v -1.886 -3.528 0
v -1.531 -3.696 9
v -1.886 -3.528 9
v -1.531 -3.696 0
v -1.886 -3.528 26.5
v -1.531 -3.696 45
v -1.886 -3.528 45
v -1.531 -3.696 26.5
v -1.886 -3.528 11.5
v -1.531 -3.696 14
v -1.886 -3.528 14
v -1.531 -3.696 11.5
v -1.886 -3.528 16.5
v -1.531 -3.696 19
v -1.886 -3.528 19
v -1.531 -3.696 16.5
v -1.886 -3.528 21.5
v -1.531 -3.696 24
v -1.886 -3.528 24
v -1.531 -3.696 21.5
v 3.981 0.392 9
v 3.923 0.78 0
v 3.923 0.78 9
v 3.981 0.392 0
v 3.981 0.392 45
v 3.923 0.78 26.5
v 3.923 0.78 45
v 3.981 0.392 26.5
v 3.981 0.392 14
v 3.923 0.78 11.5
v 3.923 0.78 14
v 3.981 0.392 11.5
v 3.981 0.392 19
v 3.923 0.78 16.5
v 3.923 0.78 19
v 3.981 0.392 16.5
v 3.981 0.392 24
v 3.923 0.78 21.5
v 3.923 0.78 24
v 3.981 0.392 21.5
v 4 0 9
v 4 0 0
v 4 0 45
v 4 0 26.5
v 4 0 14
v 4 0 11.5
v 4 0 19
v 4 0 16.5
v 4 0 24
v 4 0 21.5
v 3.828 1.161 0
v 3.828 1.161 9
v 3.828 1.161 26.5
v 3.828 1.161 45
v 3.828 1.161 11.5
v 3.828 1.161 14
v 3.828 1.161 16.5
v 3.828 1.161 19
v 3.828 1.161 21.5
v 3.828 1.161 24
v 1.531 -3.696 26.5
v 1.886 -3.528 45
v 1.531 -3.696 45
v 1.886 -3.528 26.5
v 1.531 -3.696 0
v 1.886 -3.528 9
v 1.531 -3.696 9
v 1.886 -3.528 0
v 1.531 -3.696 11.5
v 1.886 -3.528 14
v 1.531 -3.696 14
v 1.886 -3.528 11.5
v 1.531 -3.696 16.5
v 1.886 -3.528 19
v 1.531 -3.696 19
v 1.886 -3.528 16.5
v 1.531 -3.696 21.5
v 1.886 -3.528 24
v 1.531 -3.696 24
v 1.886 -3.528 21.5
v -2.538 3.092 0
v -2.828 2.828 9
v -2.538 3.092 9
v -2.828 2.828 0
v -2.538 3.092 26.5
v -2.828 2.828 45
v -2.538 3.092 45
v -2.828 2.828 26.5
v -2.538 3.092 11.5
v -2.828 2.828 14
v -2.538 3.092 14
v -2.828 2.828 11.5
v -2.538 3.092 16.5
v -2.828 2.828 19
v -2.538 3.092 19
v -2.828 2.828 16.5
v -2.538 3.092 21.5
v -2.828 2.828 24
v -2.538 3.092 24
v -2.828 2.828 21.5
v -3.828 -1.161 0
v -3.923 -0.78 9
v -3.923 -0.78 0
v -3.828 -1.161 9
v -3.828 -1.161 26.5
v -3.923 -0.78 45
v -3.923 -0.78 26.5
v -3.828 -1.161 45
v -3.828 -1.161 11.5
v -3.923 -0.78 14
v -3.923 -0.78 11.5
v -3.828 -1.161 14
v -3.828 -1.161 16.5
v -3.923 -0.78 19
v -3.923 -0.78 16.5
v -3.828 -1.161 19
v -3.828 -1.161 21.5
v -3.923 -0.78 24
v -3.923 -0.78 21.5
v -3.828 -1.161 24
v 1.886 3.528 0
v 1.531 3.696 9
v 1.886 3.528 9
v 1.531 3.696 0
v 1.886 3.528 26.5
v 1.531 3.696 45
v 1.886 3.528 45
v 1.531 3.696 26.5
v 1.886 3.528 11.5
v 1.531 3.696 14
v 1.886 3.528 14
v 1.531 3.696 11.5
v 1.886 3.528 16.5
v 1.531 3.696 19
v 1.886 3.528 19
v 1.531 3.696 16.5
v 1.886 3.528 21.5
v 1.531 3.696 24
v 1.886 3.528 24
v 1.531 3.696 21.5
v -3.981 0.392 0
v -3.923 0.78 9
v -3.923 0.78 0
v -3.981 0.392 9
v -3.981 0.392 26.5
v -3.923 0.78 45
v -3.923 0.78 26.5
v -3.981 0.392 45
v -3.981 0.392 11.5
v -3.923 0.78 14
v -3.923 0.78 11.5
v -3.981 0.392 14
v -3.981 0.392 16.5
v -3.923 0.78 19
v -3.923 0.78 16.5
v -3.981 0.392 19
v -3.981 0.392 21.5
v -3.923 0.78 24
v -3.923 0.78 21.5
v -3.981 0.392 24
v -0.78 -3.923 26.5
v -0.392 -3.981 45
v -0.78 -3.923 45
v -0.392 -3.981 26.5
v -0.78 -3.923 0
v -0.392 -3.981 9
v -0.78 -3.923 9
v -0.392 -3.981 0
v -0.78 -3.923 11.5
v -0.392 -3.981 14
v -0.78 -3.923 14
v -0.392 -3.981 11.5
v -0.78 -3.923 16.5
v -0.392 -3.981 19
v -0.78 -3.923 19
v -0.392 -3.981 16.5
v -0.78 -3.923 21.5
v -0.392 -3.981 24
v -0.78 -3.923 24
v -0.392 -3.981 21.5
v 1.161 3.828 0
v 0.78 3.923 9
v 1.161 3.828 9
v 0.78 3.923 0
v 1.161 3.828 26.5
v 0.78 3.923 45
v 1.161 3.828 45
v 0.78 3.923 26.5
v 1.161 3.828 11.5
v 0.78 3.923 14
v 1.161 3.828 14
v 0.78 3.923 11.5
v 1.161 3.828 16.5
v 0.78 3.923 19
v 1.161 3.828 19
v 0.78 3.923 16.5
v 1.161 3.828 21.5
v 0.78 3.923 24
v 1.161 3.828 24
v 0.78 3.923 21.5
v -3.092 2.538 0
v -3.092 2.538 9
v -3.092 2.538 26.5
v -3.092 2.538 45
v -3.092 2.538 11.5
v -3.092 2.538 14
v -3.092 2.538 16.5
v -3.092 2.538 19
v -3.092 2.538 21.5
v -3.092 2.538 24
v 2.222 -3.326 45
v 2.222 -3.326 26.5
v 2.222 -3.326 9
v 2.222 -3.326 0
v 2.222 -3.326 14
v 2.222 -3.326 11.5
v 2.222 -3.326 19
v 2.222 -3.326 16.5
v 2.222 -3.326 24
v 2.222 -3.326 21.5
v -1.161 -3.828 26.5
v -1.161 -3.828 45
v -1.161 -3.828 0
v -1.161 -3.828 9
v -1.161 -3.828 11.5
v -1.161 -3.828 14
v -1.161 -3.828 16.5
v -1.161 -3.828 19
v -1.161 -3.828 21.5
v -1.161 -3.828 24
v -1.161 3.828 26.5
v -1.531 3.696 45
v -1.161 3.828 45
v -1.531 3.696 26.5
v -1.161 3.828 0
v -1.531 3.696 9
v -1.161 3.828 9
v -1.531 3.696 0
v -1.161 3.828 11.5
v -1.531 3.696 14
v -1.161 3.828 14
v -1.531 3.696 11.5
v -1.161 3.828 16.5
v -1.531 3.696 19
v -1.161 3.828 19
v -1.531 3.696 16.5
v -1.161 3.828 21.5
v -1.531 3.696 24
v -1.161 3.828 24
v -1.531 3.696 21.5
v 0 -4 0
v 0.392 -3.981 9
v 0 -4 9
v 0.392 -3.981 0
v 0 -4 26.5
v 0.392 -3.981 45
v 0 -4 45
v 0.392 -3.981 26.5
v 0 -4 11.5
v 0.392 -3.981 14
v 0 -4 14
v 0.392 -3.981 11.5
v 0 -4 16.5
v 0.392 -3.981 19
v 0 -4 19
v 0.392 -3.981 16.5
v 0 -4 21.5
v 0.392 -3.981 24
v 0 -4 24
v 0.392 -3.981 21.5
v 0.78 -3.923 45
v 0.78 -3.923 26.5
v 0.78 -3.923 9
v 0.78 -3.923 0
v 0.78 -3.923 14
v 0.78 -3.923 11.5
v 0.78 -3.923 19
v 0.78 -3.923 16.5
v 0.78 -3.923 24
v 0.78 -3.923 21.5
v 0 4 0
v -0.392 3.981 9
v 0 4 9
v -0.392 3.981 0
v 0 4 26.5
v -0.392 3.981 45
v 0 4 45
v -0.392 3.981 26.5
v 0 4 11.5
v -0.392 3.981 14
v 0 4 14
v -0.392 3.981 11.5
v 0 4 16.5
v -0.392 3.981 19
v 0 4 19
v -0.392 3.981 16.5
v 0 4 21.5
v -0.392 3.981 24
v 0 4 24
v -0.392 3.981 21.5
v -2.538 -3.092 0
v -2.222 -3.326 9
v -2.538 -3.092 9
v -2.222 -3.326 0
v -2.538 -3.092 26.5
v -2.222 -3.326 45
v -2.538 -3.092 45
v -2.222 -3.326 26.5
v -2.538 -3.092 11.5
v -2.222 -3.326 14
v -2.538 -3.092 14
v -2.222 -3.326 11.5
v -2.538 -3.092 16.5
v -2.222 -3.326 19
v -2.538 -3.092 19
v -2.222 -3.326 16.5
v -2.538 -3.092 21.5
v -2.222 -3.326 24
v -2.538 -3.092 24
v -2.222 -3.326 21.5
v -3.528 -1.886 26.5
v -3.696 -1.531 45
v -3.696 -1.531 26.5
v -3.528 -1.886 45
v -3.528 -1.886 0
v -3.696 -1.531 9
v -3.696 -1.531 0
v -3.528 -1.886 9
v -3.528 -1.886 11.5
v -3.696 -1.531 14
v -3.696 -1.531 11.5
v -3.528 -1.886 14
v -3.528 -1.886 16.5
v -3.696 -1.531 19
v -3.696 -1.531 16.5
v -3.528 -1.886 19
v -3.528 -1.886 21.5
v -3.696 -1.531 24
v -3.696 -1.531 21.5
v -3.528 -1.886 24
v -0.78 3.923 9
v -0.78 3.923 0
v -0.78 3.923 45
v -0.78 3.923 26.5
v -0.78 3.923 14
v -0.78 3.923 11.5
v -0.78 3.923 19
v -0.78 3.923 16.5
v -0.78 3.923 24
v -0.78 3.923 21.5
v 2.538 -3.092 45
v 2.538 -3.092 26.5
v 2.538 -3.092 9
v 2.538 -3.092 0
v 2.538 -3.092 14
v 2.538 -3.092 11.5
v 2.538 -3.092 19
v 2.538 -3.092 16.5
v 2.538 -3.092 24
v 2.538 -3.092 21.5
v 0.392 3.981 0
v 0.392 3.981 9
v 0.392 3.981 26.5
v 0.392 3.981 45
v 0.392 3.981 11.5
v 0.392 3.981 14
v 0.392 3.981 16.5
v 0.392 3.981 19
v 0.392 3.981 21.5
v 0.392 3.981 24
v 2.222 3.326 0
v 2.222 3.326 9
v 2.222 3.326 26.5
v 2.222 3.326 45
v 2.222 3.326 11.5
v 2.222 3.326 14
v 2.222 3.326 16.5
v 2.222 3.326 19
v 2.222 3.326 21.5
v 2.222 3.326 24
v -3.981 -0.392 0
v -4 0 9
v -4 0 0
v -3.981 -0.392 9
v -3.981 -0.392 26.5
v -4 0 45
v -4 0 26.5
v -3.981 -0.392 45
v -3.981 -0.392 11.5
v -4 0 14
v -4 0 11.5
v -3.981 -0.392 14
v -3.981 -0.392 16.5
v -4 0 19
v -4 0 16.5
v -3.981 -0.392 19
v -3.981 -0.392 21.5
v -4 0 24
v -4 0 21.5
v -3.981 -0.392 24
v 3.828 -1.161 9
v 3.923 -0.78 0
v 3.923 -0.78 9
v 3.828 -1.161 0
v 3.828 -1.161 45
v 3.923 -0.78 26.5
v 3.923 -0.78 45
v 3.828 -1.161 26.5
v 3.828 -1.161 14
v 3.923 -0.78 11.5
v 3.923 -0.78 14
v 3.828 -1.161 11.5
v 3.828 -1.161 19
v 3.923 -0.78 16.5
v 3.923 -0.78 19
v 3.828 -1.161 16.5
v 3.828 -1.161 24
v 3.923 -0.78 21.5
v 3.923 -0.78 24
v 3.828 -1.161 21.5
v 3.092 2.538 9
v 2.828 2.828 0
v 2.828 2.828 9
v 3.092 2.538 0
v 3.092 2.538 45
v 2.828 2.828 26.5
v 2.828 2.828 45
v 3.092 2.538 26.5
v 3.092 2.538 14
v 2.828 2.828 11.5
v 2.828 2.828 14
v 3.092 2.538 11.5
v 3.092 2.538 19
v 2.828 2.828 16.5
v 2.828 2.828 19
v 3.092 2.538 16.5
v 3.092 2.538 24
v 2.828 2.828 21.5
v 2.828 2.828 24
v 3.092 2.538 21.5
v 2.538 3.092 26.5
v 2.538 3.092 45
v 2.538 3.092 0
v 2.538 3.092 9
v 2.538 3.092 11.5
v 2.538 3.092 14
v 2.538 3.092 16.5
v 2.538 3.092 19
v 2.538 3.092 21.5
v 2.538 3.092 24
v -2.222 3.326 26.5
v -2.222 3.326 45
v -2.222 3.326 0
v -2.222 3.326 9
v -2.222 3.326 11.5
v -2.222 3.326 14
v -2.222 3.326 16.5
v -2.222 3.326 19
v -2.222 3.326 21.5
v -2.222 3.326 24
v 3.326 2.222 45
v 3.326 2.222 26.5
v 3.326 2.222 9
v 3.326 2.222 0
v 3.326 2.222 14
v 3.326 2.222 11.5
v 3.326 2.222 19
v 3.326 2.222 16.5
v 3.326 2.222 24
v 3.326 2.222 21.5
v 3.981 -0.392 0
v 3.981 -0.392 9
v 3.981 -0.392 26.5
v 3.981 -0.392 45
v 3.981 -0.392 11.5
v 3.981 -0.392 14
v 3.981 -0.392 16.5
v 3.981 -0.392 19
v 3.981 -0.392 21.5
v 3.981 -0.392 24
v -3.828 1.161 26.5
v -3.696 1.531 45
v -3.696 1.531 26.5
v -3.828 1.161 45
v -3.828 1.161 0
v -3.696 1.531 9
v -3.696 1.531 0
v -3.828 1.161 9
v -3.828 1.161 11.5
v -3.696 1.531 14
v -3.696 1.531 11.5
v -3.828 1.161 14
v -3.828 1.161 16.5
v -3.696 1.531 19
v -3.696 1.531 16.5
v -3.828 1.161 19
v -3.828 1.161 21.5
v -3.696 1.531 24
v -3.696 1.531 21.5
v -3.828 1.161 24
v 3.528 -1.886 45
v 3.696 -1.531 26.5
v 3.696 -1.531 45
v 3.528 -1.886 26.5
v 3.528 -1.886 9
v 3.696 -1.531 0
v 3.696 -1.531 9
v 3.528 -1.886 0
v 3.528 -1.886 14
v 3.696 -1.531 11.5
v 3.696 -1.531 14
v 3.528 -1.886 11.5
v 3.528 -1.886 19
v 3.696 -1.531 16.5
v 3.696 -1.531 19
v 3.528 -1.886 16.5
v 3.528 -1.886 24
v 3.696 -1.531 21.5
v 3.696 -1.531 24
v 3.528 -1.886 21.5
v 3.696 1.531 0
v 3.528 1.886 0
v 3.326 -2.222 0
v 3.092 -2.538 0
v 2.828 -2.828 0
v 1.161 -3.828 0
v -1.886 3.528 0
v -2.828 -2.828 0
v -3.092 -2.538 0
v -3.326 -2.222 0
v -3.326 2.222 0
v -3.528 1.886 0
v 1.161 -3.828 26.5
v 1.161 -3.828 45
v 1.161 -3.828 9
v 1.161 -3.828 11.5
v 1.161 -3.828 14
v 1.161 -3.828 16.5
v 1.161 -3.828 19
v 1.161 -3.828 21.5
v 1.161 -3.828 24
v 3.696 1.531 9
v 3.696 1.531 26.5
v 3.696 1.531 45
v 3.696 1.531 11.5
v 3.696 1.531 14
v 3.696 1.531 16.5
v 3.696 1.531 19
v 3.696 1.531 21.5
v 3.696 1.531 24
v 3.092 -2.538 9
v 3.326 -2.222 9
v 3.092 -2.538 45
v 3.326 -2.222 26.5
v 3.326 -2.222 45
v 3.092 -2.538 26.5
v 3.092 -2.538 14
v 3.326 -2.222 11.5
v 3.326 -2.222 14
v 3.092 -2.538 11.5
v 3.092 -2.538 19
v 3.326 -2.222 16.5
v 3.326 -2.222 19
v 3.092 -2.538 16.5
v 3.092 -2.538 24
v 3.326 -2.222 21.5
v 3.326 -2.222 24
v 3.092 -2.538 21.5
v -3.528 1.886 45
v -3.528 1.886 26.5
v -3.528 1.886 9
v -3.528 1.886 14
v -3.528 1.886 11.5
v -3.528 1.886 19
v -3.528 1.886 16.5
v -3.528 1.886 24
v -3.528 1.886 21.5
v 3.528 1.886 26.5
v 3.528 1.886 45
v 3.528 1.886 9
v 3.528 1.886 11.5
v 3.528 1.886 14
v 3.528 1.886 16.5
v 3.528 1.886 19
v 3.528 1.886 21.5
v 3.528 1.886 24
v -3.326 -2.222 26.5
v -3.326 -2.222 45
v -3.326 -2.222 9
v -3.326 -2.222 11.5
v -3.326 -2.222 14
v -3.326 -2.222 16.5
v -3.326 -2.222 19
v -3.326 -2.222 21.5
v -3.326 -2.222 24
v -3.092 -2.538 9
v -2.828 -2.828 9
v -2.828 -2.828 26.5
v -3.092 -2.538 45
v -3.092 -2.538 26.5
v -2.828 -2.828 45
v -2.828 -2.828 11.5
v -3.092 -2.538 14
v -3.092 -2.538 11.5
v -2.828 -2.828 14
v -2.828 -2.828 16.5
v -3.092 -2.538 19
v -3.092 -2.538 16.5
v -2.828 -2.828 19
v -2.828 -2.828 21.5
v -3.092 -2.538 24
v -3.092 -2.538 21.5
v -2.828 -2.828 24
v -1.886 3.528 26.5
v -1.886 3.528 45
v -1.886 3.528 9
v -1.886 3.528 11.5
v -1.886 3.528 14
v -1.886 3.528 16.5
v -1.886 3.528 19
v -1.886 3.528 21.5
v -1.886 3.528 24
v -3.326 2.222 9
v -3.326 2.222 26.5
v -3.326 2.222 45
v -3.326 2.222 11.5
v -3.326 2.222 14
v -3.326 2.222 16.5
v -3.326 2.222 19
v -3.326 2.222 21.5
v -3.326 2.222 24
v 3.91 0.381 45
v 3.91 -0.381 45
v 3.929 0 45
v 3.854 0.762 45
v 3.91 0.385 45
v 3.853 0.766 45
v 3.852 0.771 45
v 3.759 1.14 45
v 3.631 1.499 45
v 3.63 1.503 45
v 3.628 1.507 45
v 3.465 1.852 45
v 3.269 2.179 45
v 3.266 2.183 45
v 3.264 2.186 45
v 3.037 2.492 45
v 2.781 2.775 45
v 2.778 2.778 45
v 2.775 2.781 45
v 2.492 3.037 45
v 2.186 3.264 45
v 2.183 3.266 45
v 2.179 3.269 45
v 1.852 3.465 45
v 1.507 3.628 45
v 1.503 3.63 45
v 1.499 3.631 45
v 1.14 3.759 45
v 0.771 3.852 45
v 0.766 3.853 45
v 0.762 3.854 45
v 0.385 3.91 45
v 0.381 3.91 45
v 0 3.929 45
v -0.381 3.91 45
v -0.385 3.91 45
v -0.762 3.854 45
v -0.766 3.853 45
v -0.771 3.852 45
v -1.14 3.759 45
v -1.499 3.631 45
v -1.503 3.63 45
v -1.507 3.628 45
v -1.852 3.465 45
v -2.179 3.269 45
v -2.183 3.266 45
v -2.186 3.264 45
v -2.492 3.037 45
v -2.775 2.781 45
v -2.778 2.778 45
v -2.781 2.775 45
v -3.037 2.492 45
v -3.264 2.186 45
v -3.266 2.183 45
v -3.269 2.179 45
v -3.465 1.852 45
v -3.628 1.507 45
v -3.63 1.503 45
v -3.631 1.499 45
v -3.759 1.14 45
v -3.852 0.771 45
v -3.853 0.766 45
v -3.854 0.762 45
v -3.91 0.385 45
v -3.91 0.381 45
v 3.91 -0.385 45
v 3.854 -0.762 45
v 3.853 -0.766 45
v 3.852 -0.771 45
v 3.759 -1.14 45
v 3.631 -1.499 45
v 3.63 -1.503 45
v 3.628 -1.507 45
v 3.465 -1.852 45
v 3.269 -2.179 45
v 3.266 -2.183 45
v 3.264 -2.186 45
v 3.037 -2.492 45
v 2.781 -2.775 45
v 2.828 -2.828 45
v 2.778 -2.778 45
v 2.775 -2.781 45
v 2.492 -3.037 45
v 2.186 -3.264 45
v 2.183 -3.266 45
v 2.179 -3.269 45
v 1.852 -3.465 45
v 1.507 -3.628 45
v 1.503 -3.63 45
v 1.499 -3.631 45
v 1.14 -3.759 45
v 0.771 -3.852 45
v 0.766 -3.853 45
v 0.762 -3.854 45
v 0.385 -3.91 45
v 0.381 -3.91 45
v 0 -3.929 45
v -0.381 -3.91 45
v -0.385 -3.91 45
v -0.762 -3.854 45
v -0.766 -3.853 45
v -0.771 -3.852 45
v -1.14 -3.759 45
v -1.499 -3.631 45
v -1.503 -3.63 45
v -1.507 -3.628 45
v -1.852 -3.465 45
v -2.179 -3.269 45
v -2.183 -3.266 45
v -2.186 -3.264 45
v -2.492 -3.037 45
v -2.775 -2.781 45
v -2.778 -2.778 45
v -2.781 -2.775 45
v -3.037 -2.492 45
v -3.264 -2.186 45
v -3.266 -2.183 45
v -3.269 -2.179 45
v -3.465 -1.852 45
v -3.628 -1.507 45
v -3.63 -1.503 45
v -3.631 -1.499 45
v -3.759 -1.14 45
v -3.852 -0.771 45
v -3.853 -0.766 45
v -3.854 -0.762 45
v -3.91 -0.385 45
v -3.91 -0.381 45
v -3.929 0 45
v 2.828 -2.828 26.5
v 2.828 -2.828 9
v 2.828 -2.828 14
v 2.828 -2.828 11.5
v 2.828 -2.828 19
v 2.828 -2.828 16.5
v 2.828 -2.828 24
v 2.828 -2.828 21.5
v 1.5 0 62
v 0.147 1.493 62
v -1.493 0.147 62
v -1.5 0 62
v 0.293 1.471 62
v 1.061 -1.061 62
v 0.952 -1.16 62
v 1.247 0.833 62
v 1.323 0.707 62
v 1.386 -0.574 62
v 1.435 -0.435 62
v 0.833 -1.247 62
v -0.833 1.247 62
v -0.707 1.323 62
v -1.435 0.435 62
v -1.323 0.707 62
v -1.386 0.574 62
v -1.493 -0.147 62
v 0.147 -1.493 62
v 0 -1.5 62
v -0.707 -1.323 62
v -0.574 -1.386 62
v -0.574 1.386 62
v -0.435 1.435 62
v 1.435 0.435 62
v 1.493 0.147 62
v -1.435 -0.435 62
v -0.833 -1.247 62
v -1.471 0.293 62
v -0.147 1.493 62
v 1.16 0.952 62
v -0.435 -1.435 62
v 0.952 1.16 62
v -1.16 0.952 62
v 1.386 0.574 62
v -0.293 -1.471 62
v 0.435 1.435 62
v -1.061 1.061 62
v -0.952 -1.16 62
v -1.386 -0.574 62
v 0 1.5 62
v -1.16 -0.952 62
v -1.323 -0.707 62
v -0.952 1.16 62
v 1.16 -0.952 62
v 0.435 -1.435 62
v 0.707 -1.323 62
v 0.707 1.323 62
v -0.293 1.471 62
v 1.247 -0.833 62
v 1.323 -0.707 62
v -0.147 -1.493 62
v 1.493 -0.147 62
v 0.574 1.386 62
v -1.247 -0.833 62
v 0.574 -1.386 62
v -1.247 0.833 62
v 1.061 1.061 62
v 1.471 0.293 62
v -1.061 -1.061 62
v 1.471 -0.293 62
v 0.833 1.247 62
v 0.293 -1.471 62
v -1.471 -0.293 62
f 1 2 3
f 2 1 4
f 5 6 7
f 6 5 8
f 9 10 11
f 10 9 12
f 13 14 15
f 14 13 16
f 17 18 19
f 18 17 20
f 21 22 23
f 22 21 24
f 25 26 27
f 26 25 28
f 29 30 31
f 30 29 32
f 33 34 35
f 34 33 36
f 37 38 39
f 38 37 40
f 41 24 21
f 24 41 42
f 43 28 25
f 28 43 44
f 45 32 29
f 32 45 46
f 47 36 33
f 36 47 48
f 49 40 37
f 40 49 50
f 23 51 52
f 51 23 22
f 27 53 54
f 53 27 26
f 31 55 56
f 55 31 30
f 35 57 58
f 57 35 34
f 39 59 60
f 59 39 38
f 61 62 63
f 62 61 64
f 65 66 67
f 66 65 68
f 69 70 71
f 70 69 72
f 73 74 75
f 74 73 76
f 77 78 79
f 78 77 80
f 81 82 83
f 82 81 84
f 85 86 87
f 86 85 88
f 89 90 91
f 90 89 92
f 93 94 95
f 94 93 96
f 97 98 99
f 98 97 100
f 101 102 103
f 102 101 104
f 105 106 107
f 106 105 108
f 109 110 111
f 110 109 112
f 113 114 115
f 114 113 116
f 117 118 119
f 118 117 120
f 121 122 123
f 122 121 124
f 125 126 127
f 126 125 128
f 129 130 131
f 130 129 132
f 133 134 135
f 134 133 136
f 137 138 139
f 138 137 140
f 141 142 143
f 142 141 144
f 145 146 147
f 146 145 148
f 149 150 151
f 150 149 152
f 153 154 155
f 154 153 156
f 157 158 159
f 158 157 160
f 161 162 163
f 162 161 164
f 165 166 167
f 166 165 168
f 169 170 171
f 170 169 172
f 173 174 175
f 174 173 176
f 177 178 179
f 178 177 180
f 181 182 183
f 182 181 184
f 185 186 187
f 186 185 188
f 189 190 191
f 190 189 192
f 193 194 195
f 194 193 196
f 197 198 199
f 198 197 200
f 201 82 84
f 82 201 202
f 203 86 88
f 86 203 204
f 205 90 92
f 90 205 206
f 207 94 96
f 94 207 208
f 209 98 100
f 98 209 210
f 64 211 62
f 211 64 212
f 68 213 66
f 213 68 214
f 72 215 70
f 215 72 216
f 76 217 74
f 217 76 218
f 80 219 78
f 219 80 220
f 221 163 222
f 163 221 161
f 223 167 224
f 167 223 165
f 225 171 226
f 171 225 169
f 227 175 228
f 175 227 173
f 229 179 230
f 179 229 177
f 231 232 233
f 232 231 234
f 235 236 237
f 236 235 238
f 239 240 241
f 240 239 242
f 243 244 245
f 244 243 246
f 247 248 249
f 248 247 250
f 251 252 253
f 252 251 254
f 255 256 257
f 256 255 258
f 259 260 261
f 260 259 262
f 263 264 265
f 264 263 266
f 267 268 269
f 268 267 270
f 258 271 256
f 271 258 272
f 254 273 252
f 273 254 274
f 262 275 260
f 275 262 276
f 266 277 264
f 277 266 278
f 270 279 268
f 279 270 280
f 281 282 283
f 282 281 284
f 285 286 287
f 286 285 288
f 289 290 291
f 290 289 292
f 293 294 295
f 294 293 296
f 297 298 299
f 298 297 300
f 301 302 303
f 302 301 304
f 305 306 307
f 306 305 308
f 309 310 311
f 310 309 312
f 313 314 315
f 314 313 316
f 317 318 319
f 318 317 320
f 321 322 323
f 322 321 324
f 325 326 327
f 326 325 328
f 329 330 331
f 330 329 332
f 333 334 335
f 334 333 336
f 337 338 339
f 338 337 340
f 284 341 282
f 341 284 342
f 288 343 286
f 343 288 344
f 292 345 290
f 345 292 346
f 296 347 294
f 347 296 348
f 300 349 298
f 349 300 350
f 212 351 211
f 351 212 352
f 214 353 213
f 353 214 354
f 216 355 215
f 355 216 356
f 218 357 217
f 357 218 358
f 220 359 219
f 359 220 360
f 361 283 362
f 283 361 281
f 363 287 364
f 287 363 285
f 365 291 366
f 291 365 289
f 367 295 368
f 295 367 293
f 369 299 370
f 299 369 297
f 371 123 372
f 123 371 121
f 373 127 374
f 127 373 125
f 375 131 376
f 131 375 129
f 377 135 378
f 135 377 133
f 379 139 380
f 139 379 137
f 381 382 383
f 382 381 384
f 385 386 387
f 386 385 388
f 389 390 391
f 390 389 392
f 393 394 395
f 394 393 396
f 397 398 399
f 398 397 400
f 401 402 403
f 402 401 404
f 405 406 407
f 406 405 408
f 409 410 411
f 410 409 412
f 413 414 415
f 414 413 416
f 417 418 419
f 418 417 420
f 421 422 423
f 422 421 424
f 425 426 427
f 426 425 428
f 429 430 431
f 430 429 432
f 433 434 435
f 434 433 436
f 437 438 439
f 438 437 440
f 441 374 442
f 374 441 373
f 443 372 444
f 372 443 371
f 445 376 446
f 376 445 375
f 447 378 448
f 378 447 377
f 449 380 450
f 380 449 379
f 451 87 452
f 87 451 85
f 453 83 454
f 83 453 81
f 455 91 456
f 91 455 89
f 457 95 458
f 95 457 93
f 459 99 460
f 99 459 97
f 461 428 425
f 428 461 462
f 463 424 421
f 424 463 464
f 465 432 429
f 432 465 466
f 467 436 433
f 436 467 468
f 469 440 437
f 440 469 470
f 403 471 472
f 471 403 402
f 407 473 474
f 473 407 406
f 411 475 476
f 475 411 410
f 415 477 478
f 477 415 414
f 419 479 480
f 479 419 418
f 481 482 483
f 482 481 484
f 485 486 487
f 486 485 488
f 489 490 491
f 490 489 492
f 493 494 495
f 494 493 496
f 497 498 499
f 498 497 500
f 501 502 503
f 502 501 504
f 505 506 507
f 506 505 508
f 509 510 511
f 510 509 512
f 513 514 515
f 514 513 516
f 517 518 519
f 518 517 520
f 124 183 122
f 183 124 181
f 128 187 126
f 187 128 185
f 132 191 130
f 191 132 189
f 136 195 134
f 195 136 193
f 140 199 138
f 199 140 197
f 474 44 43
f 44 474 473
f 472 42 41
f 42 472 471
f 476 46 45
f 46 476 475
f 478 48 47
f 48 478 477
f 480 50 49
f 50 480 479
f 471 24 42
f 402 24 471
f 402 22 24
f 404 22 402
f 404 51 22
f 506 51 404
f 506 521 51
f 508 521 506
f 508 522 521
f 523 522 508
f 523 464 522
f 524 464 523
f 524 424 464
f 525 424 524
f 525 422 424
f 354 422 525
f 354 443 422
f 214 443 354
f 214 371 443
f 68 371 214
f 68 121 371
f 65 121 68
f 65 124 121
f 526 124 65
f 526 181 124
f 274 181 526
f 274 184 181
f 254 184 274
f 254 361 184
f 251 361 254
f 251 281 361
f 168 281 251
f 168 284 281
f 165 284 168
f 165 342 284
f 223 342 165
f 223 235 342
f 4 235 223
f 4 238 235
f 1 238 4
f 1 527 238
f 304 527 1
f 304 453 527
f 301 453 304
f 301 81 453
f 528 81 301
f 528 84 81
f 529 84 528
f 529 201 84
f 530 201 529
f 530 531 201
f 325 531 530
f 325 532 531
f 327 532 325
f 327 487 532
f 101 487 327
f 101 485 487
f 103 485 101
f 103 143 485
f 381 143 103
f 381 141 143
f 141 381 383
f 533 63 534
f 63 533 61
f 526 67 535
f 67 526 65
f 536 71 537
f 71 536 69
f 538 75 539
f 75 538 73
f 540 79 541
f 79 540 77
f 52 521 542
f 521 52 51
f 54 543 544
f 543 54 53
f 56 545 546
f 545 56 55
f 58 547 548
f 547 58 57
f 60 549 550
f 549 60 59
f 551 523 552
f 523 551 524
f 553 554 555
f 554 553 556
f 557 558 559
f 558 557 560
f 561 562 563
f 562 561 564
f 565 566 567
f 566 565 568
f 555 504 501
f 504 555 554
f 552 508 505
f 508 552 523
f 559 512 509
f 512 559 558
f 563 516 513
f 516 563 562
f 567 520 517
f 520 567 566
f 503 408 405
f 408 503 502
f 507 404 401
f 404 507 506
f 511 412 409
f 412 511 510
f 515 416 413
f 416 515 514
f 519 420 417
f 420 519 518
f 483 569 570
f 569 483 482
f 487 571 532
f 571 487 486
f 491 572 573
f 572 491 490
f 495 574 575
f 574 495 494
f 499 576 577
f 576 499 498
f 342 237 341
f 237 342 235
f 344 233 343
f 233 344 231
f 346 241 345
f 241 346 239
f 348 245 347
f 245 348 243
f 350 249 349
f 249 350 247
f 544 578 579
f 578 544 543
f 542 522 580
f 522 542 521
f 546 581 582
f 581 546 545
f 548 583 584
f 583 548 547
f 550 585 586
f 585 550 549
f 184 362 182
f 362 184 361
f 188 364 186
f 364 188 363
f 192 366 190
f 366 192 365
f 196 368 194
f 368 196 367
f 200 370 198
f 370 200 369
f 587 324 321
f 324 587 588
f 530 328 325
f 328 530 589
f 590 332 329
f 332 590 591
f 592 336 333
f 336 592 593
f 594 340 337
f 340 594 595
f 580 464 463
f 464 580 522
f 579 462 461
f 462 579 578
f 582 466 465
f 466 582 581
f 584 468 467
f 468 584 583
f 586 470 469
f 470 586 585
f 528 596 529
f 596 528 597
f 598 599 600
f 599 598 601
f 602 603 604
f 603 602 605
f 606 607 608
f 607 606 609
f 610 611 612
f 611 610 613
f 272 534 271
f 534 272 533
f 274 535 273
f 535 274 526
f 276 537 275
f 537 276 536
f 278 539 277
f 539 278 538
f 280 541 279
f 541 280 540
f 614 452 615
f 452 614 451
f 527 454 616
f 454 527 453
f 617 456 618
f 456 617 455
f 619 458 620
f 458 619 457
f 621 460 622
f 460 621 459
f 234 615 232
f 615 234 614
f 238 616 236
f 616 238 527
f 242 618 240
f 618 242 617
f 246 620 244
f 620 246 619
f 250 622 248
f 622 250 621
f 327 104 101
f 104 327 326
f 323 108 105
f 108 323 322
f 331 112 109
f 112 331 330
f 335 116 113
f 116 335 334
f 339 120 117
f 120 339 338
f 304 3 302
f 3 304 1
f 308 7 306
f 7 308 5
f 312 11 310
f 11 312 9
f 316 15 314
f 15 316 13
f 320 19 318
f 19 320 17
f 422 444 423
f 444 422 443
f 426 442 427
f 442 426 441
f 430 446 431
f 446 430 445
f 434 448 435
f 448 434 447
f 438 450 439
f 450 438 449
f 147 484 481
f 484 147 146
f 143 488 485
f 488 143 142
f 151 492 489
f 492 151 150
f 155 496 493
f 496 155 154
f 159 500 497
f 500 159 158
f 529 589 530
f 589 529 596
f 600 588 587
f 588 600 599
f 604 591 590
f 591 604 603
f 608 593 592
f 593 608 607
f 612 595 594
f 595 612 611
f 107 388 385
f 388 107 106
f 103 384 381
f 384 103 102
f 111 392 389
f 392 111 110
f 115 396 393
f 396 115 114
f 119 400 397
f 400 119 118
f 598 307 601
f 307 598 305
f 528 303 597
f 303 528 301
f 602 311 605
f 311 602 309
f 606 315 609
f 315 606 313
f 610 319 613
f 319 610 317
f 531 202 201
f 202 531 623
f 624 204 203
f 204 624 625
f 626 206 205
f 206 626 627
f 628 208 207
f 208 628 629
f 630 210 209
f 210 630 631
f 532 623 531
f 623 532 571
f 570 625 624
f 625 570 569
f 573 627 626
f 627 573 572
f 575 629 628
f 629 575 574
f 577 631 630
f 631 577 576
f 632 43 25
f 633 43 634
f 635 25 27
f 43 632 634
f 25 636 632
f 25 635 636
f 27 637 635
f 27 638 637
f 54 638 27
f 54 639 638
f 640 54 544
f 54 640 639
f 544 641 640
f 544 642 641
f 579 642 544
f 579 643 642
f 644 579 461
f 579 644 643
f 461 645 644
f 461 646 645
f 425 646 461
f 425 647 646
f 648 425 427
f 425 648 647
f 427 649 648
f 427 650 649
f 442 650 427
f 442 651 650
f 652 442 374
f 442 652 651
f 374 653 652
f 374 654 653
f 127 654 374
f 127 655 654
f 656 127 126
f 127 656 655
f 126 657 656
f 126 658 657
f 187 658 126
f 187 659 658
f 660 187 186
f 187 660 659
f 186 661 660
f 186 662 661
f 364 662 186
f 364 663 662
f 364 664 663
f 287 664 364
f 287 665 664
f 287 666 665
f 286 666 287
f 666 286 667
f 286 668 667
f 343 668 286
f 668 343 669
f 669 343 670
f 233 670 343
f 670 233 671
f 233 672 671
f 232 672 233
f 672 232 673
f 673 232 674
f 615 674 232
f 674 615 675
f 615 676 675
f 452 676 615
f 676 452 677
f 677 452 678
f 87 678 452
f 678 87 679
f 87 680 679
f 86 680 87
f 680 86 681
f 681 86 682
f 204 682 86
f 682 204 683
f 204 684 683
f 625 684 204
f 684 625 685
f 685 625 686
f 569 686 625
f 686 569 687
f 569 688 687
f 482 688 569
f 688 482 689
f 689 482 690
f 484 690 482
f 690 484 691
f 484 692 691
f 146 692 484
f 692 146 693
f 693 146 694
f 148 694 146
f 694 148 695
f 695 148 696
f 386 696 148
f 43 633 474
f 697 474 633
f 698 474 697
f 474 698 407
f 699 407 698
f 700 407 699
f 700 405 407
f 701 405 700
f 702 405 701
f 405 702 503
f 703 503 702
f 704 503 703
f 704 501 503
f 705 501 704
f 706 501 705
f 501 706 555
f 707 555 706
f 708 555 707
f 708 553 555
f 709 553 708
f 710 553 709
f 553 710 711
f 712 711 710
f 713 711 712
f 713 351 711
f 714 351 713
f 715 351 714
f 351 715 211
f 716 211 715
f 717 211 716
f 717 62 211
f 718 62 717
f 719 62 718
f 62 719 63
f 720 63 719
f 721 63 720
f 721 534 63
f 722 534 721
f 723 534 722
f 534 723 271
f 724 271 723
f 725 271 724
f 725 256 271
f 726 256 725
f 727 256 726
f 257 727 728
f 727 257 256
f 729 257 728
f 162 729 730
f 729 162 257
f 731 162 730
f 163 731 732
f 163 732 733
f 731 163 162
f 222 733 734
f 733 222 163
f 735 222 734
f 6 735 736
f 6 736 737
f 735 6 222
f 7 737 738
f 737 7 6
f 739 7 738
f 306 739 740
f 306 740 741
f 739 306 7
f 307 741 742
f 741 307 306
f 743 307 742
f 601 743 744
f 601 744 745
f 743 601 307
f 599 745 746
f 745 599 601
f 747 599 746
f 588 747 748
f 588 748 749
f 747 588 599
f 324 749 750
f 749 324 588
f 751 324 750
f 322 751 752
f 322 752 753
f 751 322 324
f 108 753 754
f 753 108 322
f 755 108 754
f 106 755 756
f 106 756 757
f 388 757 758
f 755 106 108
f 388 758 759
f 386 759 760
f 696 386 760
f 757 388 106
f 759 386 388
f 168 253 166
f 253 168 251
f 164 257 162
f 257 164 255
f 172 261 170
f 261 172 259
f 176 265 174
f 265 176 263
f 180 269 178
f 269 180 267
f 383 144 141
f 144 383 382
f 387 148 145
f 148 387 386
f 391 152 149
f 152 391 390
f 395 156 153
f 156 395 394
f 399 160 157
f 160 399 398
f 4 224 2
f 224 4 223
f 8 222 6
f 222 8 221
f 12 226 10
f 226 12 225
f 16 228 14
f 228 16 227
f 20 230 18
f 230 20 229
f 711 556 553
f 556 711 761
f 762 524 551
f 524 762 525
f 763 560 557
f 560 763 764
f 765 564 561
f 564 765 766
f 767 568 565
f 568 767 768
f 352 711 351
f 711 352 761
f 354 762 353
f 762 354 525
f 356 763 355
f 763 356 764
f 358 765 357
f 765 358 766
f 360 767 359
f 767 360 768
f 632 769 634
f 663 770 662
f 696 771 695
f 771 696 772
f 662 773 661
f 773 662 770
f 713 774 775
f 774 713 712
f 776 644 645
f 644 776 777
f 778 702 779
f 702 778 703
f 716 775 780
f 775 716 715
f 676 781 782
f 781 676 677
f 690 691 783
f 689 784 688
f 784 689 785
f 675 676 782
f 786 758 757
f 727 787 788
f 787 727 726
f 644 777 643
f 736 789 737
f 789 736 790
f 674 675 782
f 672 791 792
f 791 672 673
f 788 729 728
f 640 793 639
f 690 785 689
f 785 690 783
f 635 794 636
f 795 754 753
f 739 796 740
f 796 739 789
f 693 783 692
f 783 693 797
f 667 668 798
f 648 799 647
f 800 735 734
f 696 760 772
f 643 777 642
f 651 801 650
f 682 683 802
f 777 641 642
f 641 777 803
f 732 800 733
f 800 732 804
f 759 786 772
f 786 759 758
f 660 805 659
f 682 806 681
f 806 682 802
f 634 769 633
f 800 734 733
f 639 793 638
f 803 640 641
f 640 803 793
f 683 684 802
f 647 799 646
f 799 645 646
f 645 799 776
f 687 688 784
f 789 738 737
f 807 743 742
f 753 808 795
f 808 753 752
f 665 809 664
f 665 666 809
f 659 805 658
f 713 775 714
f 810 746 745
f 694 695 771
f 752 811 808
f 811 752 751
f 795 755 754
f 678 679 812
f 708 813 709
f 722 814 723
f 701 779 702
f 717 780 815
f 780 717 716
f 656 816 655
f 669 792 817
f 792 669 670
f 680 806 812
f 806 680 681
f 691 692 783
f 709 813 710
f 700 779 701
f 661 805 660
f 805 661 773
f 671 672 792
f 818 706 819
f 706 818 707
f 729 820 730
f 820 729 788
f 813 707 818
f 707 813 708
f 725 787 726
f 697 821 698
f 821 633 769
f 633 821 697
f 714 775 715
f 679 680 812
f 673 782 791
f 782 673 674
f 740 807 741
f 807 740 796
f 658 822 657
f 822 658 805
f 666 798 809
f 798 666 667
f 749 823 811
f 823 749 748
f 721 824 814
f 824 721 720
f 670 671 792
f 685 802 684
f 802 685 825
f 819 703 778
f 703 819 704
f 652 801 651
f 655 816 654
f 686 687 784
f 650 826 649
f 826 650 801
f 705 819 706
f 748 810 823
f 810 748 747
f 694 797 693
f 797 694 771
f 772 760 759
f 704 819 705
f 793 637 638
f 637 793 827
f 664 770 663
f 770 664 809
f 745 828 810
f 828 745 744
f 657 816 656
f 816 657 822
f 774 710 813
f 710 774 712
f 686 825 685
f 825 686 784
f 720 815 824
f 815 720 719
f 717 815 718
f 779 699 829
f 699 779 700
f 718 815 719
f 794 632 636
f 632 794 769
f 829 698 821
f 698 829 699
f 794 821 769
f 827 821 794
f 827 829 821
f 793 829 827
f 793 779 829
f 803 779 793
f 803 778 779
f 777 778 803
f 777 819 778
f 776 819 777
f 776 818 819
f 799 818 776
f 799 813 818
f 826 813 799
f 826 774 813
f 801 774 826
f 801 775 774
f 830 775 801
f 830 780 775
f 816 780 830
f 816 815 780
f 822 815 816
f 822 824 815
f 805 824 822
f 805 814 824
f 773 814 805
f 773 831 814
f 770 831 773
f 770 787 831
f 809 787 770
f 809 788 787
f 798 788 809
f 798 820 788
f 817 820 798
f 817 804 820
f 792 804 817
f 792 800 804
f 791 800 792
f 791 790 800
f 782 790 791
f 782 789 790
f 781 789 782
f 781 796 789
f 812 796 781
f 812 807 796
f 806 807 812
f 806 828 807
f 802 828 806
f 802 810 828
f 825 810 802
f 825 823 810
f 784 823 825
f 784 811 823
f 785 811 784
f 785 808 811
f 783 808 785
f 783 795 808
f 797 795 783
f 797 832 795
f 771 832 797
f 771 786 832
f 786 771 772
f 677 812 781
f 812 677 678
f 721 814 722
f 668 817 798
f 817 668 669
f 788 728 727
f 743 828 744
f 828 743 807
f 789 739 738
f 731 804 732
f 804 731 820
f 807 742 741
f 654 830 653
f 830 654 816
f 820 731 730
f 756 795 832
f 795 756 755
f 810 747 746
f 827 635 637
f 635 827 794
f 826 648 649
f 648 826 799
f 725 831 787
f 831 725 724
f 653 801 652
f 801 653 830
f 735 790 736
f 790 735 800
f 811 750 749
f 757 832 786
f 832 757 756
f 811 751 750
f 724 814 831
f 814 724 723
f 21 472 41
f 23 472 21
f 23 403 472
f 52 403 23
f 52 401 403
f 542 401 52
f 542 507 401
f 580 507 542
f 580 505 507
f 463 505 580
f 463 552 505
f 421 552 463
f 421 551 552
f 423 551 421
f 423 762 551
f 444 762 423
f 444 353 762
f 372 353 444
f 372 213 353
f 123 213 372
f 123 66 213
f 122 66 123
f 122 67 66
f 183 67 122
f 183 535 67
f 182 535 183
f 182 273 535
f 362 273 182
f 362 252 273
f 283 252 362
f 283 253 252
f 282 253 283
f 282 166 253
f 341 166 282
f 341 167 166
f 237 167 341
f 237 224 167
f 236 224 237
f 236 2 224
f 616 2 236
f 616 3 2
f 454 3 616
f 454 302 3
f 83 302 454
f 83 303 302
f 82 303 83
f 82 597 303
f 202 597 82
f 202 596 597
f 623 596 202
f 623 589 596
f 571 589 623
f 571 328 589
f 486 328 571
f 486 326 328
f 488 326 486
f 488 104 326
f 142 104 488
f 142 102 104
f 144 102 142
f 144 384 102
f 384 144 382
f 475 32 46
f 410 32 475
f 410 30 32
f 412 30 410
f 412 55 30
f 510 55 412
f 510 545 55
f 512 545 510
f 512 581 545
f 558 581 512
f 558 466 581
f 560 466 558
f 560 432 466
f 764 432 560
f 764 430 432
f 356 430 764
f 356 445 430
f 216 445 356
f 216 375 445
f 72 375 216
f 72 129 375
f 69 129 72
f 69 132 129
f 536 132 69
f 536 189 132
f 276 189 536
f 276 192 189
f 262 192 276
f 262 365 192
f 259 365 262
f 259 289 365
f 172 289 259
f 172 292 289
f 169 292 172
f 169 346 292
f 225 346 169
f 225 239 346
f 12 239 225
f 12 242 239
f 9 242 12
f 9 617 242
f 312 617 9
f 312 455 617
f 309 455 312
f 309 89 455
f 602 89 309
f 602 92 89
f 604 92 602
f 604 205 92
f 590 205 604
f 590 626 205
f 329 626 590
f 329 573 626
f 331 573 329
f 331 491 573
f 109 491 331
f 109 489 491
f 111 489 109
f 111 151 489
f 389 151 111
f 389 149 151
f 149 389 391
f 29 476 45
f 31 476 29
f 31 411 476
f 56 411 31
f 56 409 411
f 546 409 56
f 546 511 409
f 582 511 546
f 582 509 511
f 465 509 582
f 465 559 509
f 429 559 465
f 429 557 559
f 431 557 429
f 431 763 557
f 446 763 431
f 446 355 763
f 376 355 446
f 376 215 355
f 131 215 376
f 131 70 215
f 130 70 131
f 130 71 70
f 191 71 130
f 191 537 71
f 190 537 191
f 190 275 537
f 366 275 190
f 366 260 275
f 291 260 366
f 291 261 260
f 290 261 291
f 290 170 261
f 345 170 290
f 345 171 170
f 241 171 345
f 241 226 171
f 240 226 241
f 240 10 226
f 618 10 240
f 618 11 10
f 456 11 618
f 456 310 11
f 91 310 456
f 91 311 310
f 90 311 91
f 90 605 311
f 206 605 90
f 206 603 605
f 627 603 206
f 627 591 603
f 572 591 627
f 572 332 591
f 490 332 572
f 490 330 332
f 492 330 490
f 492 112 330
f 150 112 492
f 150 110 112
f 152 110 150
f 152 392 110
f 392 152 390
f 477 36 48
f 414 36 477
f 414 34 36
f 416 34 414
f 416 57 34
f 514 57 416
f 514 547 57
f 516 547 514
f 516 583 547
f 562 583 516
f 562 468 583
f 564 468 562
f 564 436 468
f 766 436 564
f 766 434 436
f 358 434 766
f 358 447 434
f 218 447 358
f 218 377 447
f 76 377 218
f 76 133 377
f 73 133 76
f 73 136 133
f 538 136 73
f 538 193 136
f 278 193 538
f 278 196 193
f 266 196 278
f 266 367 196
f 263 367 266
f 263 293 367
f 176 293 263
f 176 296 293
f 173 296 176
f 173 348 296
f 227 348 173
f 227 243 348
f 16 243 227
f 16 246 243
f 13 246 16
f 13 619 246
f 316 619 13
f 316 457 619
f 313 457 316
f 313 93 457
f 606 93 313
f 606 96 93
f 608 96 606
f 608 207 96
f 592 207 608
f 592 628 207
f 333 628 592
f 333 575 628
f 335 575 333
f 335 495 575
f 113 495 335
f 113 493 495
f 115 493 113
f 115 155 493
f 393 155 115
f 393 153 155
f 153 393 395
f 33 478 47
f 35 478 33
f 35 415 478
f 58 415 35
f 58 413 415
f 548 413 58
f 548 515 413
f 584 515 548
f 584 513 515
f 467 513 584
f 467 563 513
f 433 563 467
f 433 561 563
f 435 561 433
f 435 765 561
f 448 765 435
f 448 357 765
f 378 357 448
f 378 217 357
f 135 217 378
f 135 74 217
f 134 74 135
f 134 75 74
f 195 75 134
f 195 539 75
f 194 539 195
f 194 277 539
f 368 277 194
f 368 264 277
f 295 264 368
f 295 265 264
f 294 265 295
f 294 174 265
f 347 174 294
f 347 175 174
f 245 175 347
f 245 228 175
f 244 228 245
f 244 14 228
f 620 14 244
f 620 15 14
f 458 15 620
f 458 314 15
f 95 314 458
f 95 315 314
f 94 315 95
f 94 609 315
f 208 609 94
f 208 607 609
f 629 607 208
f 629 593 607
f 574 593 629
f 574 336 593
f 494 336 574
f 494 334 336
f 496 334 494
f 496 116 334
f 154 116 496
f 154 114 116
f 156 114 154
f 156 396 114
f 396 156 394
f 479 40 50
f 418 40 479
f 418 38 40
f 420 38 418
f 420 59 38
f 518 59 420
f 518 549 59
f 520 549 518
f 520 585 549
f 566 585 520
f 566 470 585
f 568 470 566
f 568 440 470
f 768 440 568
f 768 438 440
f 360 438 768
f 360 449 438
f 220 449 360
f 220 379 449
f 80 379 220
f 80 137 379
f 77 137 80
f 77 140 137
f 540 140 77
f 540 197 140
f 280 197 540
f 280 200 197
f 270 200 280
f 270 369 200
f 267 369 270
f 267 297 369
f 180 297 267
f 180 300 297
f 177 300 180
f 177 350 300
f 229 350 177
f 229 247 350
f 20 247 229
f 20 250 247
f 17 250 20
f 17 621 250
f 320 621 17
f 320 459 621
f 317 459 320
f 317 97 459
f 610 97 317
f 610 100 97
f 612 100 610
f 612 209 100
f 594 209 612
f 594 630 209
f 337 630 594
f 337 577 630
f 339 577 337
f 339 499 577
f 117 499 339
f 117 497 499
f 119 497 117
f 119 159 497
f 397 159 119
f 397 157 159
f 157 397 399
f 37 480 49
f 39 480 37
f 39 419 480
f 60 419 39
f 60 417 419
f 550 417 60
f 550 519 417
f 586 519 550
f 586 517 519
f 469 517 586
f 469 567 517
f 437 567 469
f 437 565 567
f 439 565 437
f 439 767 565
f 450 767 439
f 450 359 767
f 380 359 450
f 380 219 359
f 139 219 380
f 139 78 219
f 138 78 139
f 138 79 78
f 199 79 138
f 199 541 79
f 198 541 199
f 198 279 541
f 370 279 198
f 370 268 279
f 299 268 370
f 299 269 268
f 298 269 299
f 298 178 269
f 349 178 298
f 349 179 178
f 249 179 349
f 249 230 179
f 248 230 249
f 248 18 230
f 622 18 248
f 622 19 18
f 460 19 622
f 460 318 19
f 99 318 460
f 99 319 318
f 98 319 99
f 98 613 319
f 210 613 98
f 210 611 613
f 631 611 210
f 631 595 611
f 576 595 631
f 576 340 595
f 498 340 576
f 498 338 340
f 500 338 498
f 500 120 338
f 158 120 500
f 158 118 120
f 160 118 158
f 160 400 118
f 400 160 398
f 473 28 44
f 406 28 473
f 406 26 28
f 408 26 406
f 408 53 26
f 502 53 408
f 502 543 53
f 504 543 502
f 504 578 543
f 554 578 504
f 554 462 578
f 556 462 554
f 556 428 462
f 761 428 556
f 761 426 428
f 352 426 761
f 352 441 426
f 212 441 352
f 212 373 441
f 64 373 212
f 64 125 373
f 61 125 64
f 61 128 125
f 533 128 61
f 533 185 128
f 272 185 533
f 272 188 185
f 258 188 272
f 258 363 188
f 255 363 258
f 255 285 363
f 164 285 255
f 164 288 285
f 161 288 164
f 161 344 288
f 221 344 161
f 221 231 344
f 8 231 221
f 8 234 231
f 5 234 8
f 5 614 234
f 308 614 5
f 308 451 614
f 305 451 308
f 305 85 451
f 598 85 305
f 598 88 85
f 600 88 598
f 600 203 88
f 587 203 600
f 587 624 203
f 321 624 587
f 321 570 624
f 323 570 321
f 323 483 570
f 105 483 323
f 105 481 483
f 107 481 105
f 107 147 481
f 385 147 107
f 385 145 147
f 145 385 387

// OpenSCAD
// Tissue-pestle for 1.5 mL microcentrifuge tubes
// Print orientation: standing upright on the bed (z = 0)

$fn = 64;

// ---- Dimensions (mm) ----
handle_d      = 8;    // handle diameter
handle_h      = 45;   // handle height (z = 0 to 45)
cone_d        = 8;    // cone diameter at handle top
cone_tip_d    = 3;    // cone diameter at tip
cone_top_z    = 62;   // cone top / sphere centre height
sphere_d      = 3;    // tip sphere diameter
groove_count  = 4;    // number of circumferential grooves
groove_w      = 2;    // groove width (in Z)
groove_depth  = 1;    // groove depth
overlap       = 0.5;  // overlap for clean booleans

// ---- Model ----
difference() {
    union() {
        // Handle
        cylinder(d = handle_d, h = handle_h);

        // Cone
        translate([0, 0, handle_h - overlap])
            cylinder(d1 = cone_d, d2 = cone_tip_d, h = cone_top_z - handle_h + overlap);

        // Tip sphere
        translate([0, 0, cone_top_z - sphere_d / 2])
            sphere(d = sphere_d);
    }

    // Grooves
    for (i = [0 : groove_count - 1]) {
        z = 10 + i * 5;
        translate([0, 0, z - groove_w / 2])
            cylinder(d = handle_d + 2 * overlap, h = groove_w + overlap);
    }
}
